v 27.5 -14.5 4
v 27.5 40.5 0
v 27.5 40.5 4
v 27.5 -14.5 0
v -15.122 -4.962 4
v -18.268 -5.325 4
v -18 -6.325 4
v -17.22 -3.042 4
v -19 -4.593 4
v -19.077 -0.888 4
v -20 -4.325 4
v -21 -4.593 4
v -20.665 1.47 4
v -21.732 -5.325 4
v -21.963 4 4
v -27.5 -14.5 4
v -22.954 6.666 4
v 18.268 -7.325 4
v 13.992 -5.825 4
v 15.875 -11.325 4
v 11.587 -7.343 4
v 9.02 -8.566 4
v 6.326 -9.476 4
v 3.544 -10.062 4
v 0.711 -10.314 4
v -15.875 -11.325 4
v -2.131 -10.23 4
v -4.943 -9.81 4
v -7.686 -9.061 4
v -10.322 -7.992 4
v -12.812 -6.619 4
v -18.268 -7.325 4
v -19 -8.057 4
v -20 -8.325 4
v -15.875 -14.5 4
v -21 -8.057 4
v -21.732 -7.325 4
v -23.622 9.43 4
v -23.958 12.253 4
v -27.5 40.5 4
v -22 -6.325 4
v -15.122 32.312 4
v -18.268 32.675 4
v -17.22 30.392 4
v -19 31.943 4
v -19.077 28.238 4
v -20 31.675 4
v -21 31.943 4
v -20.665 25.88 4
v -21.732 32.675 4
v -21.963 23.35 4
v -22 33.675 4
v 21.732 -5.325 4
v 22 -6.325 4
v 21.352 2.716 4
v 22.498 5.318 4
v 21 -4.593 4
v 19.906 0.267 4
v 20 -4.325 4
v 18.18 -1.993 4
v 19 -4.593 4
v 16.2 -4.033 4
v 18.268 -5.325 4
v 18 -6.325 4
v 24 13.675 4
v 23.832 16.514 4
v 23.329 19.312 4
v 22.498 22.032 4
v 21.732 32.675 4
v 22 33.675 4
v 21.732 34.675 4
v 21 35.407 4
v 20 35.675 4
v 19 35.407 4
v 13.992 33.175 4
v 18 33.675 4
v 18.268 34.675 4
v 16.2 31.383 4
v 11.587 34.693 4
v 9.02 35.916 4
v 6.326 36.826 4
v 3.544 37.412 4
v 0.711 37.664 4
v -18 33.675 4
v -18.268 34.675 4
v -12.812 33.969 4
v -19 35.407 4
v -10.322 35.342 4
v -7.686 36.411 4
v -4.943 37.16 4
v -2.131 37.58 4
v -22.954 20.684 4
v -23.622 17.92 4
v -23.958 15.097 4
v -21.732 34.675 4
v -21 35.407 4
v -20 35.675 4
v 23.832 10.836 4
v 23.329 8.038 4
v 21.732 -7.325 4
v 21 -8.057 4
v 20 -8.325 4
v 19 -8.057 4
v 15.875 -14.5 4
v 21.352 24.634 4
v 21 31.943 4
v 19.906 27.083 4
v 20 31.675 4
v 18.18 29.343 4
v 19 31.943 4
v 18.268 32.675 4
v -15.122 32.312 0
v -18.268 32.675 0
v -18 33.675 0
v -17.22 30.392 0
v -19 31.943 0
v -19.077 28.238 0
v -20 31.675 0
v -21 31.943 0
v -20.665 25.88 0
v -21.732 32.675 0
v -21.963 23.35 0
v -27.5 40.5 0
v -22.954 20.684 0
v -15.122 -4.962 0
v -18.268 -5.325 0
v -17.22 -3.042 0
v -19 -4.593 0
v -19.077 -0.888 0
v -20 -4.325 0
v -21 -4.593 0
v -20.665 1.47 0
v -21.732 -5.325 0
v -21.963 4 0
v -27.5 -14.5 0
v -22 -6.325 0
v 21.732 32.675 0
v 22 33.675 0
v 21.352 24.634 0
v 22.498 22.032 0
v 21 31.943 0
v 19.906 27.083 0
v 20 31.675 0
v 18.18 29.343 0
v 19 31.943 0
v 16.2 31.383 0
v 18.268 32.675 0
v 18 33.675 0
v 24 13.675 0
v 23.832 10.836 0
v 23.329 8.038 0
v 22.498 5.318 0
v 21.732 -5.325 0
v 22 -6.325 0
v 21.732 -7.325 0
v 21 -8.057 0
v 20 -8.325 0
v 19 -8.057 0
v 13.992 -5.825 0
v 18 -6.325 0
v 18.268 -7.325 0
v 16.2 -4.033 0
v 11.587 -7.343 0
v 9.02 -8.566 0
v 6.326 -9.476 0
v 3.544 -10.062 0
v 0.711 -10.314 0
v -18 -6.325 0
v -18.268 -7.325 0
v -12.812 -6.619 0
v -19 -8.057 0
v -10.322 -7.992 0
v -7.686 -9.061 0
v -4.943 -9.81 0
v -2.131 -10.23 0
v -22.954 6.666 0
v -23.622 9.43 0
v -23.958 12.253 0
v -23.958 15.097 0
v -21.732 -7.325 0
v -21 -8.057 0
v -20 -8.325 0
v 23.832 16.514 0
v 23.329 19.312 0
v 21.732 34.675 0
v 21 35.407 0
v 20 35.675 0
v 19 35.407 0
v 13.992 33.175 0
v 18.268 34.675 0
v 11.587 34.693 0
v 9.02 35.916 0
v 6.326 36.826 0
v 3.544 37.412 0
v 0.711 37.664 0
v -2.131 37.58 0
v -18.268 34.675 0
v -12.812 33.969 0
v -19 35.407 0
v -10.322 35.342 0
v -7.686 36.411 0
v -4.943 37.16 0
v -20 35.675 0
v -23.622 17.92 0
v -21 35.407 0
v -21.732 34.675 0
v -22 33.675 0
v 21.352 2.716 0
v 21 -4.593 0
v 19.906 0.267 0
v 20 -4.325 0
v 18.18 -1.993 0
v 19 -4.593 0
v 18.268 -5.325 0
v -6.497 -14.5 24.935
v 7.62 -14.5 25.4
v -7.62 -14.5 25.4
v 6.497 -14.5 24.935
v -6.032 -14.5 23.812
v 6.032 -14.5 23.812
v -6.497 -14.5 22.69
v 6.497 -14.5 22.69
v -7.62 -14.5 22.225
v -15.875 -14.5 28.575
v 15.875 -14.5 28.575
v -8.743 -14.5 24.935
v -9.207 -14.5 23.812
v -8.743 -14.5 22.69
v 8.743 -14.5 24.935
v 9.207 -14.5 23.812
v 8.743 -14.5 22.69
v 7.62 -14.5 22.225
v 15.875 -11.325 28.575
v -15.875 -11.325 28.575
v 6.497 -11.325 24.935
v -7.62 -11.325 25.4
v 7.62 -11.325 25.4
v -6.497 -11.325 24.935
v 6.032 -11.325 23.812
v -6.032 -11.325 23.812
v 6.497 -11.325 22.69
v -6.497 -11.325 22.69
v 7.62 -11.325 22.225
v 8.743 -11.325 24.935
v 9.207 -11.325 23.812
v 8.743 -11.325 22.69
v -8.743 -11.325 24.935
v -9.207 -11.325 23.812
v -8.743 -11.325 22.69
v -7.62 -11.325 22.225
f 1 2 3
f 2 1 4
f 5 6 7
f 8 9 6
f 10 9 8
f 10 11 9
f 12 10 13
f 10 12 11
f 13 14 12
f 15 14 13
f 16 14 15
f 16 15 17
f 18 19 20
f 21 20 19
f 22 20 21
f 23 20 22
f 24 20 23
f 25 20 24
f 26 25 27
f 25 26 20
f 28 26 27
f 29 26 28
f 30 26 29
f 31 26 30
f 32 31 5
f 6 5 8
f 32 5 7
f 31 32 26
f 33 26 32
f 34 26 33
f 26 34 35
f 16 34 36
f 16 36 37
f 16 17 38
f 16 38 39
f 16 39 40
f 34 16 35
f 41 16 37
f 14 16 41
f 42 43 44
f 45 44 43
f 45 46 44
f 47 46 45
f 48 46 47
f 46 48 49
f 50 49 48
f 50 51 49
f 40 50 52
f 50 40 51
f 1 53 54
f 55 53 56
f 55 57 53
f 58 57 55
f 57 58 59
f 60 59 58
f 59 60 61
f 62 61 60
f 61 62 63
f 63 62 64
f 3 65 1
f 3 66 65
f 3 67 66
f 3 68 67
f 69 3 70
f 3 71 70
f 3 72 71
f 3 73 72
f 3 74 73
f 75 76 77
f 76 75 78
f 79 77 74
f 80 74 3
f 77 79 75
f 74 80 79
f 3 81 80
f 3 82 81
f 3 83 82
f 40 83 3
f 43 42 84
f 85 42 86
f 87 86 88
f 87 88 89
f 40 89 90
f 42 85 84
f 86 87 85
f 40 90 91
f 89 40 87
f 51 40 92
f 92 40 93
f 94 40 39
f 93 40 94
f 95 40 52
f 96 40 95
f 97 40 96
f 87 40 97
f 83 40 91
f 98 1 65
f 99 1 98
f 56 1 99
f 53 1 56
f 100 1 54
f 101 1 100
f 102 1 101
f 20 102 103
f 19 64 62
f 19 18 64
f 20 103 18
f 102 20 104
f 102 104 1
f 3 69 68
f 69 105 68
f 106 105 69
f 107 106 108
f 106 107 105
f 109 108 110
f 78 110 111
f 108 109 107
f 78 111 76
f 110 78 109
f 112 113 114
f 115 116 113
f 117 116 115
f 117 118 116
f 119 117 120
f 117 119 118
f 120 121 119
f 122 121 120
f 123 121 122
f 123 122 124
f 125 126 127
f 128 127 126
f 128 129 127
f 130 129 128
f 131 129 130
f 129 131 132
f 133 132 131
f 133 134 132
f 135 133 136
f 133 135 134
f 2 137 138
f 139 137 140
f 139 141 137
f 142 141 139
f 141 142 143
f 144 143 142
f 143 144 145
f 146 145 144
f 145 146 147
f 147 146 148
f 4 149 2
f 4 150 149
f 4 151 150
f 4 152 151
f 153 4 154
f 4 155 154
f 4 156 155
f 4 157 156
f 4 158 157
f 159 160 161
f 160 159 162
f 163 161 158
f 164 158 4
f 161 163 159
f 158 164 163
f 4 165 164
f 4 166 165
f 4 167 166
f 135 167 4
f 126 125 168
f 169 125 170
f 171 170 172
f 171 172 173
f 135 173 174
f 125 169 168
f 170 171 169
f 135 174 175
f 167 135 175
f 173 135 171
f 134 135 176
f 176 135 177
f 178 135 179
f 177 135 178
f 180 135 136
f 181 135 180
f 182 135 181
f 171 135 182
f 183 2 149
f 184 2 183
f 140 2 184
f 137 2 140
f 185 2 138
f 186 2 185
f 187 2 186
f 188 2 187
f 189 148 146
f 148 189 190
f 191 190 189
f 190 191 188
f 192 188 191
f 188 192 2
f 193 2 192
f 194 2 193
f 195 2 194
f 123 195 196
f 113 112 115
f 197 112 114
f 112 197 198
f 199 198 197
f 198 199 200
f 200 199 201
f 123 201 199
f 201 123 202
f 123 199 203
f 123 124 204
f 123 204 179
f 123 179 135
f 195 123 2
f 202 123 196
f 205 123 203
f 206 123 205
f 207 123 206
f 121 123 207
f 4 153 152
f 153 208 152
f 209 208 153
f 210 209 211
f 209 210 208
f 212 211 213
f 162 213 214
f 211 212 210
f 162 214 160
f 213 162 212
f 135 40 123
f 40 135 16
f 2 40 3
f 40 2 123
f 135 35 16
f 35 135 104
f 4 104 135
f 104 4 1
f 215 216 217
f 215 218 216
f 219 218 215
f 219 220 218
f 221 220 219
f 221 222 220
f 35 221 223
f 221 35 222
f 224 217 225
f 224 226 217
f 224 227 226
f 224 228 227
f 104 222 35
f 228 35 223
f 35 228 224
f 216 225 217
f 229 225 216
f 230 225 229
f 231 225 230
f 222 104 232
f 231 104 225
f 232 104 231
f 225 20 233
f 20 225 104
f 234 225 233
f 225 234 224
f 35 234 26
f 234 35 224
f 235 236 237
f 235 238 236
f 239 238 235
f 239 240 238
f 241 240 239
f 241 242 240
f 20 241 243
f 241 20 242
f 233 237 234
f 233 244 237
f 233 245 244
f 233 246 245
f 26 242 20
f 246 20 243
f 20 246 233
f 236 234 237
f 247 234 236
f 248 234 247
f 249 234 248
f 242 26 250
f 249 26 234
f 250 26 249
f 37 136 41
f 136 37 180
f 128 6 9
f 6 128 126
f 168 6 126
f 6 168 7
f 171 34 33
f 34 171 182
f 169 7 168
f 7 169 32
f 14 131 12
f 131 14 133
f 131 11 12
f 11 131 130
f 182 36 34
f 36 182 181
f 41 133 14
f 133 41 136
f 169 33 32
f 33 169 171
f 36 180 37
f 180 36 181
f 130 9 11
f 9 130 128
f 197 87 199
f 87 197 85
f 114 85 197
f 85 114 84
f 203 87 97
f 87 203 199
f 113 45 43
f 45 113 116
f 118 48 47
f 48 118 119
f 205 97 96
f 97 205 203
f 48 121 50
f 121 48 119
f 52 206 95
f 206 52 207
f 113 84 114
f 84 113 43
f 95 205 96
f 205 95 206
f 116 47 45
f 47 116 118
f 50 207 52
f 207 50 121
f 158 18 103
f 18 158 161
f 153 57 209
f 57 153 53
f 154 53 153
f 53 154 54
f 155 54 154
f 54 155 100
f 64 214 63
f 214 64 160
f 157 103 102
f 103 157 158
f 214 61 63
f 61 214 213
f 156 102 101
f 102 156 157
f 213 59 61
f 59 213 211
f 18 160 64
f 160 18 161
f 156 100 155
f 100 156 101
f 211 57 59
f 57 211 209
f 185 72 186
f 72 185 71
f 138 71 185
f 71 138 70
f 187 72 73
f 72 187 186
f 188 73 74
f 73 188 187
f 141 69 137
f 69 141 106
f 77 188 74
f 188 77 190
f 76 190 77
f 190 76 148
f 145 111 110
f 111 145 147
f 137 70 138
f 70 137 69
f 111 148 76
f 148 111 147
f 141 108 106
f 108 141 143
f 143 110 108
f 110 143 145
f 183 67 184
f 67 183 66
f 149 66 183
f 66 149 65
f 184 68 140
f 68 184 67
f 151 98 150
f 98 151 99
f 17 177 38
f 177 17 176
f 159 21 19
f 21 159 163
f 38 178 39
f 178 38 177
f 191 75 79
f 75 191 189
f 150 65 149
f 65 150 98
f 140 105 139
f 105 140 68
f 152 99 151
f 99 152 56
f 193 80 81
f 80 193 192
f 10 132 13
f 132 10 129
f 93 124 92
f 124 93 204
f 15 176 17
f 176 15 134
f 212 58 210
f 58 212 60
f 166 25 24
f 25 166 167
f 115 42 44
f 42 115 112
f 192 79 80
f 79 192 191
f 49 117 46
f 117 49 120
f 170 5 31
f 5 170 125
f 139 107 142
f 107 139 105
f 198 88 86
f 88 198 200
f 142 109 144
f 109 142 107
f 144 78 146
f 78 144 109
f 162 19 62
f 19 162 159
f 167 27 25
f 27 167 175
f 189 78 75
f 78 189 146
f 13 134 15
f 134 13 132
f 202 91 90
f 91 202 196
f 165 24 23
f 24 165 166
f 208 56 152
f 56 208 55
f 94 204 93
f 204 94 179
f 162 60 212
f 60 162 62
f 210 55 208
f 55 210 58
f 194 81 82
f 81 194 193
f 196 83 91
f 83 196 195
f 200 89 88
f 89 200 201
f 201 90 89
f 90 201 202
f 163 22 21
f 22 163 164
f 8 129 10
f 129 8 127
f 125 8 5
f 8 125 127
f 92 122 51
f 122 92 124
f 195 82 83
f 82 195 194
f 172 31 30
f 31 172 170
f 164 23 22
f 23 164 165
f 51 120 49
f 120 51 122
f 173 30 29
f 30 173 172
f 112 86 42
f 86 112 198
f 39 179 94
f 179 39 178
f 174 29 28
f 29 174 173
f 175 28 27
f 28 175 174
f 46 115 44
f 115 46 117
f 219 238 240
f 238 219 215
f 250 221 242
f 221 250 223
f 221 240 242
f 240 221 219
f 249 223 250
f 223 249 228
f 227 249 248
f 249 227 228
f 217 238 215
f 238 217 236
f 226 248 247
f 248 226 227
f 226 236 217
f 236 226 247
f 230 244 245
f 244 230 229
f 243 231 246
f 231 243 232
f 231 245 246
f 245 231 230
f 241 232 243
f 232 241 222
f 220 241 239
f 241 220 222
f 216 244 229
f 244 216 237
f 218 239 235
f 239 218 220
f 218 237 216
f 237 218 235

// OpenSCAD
// file: utils.scad
//
// general utility functions for OpenSCAD
//
function inch(in) = 25.4*in;
// main file
// ring mount for components
// Copyright (C) 2016, Theodore C Yapo

use <utils.scad>;


ring_length = 10;
center_height = 14.5;
outer_d = 2*center_height / cos(30);
ring_thickness = 4;
inner_d = outer_d - 2*ring_thickness;
screw_spacing = inch(0.6);
base_width = inch(1.25);
base_thickness = inch(0.125);
base_length = inch(1.125);

nut_block_thickness = 6;
nut_block_width = 12;

// recesses for #4-40 hex nuts
nut_d = inch(0.25) / cos(30) + 0.5;
nut_h = 3;

set_screw_d = inch(0.125);

epsilon = 1;

face_thickness = 4;
aperture_d = 12;
board_guide_depth = 1;
board_tol = 0.25;

fan_mount_width = 55;
fan_cutout_d = 48;
fan_center = 25 - center_height + base_thickness;

module fan_mount(){
  difference(){
    union(){
      // face
      translate([-fan_mount_width/2, -center_height, 0]){
        cube([fan_mount_width, fan_mount_width, face_thickness]);
      }

      // base
      translate([-base_width/2, -center_height, 0]){
        cube([base_width, base_thickness, base_length]);
      }
    }

    // fan cutout
    translate([0, fan_center, -epsilon]){
      cylinder($fn = 53, d = fan_cutout_d, h = face_thickness+2*epsilon);
    }

    // fan mounting holes
    translate([0, fan_center, 0]){
      hole_spacing = 40;
      height = 11;
      hole_d = 4;
      
      translate([-hole_spacing/2, -hole_spacing/2, -epsilon]){
        cylinder($fn = 12, d = hole_d, h = height + 2 * epsilon);
      }
      translate([-hole_spacing/2, +hole_spacing/2, -epsilon]){
        cylinder($fn = 12, d = hole_d, h = height + 2*epsilon);
      }
      translate([+hole_spacing/2, -hole_spacing/2, -epsilon]){
        cylinder($fn = 12, d = hole_d, h = height + 2*epsilon);
      }
      translate([+hole_spacing/2, +hole_spacing/2, -epsilon]){
        cylinder($fn = 12, d = hole_d, h = height + 2*epsilon);
      }
    }

    // mounting screw clearance slots
    *translate([-inch(0.6)/2,
               -center_height + base_thickness,
               (base_length - inch(0.75))/2]){
      rotate([-90, 0, 0]){
        cylinder($fn=12, d = inch(0.375), h = inch(0.125));
      }
    }
    *translate([+inch(0.6)/2,
               -center_height + base_thickness,
               (base_length - inch(0.75))/2]){
      rotate([-90, 0, 0]){
        cylinder($fn=12, d = inch(0.375), h = inch(0.125));
      }
    }
    
    
    // mounting screw holes
    *translate([-inch(0.6)/2,
               -center_height-epsilon,
               (base_length - inch(0.75))/2]){
      rotate([-90, 0, 0]){
        cylinder($fn=8, d = inch(0.125), h = inch(0.25));
      }
    }
    *translate([+inch(0.6)/2,
               -center_height-epsilon,
               (base_length - inch(0.75))/2]){
      rotate([-90, 0, 0]){
        cylinder($fn=8, d = inch(0.125), h = inch(0.25));
      }
    }
    translate([-inch(0.6)/2,
               -center_height - epsilon,
               base_length - (base_length - inch(0.75))/2]){
      rotate([-90, 0, 0]){
        cylinder($fn=8, d = inch(0.125), h = inch(0.25));
      }
    }
    translate([+inch(0.6)/2,
               -center_height - epsilon,
               base_length - (base_length - inch(0.75))/2]){
      rotate([-90, 0, 0]){
        cylinder($fn=8, d = inch(0.125), h = inch(0.25));
      }
    }
  }  
}

module fan()
{
  corner_r = 5;
  hole_spacing = 40;
  height = 11;
  hole_d = 4;
  aperture_d = 47;
  hub_d = 23;
  n_blades = 7;
  blade_thickness = 2;
  blade_offset = -2;
  blade_d = 44;
  epsilon = 1;

  difference(){
    hull(){
      translate([-hole_spacing/2, -hole_spacing/2, 0]){
        cylinder($fn = 12, r = corner_r, h = height);
      }
      translate([-hole_spacing/2, +hole_spacing/2, 0]){
        cylinder($fn = 12, r = corner_r, h = height);
      }
      translate([+hole_spacing/2, -hole_spacing/2, 0]){
        cylinder($fn = 12, r = corner_r, h = height);
      }
      translate([+hole_spacing/2, +hole_spacing/2, 0]){
        cylinder($fn = 12, r = corner_r, h = height);
      }
    }

    // aperture
    translate([0, 0, -epsilon]){
      cylinder($fn = 37, d = aperture_d, h = height + 2 * epsilon);
    }    

    // mounting holes
    translate([-hole_spacing/2, -hole_spacing/2, -epsilon]){
      cylinder($fn = 12, d = hole_d, h = height + 2 * epsilon);
    }
    translate([-hole_spacing/2, +hole_spacing/2, -epsilon]){
      cylinder($fn = 12, d = hole_d, h = height + 2*epsilon);
    }
    translate([+hole_spacing/2, -hole_spacing/2, -epsilon]){
      cylinder($fn = 12, d = hole_d, h = height + 2*epsilon);
    }
    translate([+hole_spacing/2, +hole_spacing/2, -epsilon]){
      cylinder($fn = 12, d = hole_d, h = height + 2*epsilon);
    }
  }

  // blade hub
  translate([0, 0, 0]){
    cylinder($fn = 37, d = hub_d, h = height);
  }

  // blades
  intersection(){
    for (theta = [0:360/7:360]){
      translate([0.5*hub_d*cos(theta),
                 0.5*hub_d*sin(theta),
                 height/2]){
        rotate([0, 0, theta]){
          rotate([45, 0, 0]){
            translate([blade_offset, -height/2, 0])
              linear_extrude(height = blade_thickness){
              polygon([[0, 0],
                       [0, height],
                       [(aperture_d - hub_d)/2 - blade_offset, height],
                       [(aperture_d - hub_d)/2 - blade_offset, 0]]);
            }
          }
        }
      }
    }
    // aperture
    translate([0, 0, -epsilon]){
      cylinder($fn = 37, d = blade_d, h = height + 2 * epsilon);
    }    

  }
}

module printing_layout()
{
  fan_mount();
}

module fan_mount_assembly()
{
  fan_mount();
  translate([0, 13.5, face_thickness]){
    %fan();
  }
}


printing_layout();

//fan_mount_assembly();
